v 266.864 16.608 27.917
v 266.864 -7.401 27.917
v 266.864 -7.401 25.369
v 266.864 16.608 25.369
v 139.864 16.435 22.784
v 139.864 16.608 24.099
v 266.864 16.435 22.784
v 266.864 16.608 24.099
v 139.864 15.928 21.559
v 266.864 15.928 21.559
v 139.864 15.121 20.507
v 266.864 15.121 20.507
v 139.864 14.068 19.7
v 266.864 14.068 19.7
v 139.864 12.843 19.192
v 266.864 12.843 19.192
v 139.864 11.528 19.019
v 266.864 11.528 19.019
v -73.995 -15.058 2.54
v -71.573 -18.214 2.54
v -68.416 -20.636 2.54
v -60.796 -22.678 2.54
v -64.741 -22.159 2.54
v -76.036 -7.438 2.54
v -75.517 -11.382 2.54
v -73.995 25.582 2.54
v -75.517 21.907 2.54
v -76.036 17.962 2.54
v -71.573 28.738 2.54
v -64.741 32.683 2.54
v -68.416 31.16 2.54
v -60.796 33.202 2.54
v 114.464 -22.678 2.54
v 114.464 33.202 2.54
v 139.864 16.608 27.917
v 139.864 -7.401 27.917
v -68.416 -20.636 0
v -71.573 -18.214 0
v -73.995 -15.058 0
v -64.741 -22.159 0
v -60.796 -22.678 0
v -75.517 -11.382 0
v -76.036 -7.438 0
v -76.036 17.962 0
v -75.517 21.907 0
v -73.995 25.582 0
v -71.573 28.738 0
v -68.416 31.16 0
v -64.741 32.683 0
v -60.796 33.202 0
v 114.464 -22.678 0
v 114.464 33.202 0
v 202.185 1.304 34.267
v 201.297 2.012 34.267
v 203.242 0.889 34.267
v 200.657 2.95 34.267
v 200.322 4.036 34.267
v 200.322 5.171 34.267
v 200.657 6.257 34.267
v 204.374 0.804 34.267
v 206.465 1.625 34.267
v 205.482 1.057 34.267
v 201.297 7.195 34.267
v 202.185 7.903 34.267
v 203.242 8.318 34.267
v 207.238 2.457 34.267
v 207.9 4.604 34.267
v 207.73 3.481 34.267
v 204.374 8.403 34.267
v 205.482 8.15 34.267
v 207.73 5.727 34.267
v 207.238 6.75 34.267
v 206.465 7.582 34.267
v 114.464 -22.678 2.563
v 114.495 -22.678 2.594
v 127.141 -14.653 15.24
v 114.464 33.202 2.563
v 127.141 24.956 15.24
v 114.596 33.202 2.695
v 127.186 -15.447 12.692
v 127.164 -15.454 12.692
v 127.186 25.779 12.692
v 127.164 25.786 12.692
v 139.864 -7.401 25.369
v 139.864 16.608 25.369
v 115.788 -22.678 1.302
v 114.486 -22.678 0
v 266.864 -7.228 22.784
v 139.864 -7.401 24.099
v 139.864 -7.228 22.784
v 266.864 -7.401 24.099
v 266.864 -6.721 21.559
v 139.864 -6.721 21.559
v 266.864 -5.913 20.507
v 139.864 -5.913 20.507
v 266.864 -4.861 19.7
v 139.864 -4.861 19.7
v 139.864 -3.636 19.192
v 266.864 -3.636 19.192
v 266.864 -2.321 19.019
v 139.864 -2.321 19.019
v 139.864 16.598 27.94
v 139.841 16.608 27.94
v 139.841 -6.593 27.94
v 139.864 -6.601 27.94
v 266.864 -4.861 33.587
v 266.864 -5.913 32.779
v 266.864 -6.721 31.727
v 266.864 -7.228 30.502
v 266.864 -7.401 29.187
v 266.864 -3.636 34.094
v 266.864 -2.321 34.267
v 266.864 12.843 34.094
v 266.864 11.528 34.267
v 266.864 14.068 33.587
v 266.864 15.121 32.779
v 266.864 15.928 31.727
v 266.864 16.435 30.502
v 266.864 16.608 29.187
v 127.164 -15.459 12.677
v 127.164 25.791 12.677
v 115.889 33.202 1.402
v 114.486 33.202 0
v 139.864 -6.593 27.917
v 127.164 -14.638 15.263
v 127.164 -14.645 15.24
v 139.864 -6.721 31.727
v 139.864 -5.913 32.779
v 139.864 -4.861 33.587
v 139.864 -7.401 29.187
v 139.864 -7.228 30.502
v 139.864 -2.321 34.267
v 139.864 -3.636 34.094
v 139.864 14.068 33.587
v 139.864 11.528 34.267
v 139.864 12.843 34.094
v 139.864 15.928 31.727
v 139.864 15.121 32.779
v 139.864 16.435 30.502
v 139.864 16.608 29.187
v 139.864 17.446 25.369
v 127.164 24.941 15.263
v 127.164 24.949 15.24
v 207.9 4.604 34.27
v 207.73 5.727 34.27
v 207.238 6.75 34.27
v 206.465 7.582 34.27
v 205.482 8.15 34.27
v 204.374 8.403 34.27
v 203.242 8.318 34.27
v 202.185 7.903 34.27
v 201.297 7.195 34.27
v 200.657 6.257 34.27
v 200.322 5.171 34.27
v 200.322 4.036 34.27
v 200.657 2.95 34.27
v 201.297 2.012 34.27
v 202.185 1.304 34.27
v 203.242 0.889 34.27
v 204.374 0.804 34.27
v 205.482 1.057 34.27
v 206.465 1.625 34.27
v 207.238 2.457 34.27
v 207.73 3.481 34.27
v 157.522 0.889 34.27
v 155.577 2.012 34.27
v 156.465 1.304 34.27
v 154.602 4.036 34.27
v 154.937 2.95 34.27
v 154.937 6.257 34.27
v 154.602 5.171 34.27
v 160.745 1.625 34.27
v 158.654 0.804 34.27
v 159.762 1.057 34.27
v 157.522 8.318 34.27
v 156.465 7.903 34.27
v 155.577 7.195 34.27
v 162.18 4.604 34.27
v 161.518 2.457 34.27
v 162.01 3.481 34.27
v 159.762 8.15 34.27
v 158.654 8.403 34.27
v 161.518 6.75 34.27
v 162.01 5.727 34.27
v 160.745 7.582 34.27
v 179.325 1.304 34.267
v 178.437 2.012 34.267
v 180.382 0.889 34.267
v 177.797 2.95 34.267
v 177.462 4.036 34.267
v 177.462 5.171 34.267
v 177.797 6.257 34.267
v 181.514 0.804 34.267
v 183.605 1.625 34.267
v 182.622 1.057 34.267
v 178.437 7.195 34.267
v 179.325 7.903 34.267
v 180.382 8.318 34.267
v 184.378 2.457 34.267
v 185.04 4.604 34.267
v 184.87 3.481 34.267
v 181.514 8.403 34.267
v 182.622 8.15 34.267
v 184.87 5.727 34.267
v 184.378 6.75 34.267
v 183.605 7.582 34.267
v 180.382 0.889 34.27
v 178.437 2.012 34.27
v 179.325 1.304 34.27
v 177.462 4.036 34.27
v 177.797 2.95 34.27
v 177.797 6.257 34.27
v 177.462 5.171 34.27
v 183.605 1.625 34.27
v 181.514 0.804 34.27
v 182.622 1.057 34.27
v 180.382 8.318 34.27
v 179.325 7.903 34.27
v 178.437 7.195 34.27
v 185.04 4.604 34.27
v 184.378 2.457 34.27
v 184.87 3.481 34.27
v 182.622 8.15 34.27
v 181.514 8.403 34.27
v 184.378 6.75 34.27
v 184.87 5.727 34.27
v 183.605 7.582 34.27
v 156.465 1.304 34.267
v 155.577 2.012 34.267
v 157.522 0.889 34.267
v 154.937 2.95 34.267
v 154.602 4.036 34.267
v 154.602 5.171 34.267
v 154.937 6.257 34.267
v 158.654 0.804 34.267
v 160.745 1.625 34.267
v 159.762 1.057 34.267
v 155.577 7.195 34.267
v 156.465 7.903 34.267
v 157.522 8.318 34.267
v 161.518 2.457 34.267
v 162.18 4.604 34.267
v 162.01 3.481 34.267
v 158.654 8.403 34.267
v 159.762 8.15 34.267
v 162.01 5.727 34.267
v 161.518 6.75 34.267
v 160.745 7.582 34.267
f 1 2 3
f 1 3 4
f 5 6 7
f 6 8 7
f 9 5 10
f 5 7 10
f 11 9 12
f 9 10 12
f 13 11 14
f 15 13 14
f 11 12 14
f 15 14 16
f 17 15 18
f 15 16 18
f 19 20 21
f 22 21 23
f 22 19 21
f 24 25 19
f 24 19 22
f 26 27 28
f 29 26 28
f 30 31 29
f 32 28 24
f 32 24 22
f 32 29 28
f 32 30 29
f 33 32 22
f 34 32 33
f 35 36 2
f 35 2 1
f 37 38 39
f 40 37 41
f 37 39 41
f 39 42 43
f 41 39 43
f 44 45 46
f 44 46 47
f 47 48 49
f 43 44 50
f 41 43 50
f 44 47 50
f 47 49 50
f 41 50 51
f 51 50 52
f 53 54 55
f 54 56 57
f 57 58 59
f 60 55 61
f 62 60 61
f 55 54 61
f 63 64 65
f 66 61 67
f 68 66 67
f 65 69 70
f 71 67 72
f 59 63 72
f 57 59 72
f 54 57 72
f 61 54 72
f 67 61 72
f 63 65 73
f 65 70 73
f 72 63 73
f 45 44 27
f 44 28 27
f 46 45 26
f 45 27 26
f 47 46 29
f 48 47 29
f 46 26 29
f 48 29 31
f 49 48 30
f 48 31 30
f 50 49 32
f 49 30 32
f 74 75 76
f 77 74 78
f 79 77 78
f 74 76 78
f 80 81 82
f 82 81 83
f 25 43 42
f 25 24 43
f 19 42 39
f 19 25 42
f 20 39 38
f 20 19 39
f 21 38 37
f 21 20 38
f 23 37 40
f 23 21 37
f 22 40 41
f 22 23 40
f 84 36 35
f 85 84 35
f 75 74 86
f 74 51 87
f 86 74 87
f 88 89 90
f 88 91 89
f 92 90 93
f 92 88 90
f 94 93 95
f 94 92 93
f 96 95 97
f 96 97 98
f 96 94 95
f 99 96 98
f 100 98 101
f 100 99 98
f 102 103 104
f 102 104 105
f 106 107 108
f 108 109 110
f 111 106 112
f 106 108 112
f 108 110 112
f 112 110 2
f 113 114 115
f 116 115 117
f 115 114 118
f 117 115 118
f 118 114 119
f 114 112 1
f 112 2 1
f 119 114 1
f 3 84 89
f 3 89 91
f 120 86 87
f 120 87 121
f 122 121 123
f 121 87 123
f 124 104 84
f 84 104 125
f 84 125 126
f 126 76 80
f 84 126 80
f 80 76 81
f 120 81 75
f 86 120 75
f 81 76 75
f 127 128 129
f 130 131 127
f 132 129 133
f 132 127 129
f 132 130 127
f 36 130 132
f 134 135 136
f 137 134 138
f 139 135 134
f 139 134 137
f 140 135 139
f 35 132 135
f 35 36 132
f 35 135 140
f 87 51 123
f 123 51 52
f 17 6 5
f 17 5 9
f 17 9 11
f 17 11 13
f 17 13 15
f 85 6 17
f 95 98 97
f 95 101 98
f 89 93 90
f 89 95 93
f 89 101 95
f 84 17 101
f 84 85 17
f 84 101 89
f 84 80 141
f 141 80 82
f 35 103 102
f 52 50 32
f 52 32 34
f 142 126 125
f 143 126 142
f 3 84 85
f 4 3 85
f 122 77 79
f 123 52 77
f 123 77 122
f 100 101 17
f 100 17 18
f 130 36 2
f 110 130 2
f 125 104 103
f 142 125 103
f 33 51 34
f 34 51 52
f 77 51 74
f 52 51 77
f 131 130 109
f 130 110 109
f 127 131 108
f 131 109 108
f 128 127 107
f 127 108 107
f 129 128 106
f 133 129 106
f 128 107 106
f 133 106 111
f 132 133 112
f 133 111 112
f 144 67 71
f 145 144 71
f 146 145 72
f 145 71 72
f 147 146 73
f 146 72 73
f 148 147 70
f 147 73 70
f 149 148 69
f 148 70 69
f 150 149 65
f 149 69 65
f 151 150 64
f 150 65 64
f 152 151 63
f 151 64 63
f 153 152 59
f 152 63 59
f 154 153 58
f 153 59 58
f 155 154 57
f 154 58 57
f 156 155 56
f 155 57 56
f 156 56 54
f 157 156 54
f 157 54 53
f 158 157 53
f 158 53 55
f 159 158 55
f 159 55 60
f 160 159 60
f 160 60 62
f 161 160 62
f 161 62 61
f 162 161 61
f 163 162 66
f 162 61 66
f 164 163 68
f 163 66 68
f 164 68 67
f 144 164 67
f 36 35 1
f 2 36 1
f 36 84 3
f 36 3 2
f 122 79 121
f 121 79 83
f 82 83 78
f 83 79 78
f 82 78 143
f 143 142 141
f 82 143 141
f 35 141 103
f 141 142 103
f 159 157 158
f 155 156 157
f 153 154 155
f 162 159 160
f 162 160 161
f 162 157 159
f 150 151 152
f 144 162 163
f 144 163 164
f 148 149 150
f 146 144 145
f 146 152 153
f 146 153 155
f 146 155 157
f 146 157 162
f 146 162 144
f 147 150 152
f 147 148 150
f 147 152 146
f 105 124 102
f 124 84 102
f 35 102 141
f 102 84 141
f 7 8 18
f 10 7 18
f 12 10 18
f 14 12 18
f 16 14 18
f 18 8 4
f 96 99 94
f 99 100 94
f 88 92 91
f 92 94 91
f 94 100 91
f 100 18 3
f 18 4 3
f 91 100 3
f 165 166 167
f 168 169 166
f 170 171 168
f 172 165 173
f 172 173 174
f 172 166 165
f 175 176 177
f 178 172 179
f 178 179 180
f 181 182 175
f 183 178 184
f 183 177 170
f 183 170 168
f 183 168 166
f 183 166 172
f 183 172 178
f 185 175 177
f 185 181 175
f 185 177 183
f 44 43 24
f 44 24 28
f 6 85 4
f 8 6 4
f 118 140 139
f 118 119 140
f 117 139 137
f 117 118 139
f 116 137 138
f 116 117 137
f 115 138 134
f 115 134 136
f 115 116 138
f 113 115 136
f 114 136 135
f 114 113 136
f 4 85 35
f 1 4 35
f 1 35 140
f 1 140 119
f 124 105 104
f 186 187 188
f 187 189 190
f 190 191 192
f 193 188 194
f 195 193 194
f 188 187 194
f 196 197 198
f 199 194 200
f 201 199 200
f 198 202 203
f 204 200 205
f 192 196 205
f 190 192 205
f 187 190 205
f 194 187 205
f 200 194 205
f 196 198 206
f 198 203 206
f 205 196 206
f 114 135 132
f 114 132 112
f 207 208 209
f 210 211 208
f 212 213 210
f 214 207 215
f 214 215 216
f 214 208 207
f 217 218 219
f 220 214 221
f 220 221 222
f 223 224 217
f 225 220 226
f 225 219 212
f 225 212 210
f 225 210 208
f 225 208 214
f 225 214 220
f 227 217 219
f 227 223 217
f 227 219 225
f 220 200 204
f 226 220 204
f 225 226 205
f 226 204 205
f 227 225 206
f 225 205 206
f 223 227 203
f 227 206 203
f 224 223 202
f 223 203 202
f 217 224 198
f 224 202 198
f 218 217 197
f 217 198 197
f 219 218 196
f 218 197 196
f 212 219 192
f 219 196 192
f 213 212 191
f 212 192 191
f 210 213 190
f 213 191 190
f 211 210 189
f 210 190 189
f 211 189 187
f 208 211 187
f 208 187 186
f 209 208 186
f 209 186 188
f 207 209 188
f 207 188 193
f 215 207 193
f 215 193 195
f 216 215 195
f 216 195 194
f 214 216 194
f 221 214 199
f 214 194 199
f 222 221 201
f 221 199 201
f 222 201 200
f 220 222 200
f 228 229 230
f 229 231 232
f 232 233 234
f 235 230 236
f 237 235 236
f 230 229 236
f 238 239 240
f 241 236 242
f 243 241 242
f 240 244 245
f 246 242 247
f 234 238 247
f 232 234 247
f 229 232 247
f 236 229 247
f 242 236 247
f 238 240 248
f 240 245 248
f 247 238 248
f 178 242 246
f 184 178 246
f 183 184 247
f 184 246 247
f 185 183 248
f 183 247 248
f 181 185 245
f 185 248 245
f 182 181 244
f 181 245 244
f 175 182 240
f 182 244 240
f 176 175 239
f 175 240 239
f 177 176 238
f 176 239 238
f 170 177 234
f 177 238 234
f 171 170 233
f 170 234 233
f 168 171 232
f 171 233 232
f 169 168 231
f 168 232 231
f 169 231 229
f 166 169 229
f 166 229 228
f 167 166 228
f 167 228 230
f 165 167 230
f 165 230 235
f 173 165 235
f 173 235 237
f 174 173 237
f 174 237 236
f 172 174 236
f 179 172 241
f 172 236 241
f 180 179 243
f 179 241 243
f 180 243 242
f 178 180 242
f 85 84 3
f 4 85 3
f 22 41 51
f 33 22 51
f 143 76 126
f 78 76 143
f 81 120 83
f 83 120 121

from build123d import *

# Parameters (mm, degrees)
F0_W      = 190.5
F0_H      = 55.88
F1_DEPTH  = 2.54
F2_W      = 55.88
F2_H      = 2.54
F3_DEPTH  = 12.7
F4_W      = 12.7
F4_H      = 55.88
F5_DEPTH  = 12.7
F6_W      = 55.88
F6_H      = 2.5481501573
F7_DEPTH  = 12.7
F8_W      = 12.7
F8_H      = 55.88
F9_DEPTH  = 12.7
F10_SIZE  = 12.67714
F12_DEPTH = 25.4
F14_DEPTH = 25.4
F15_W     = 24.0098635365
F15_H     = 2.5481501573
F16_DEPTH = 127
F17_W     = 127
F17_H     = 24.0098635365
F18_DEPTH = 6.35
F19_W     = 127
F19_H     = 24.0098635365
F20_DEPTH = 6.35
F21_R     = 15.24
F22_R     = 5.08
F22_2_R   = 5.08
F23_R     = 3.81
F24_DEPTH = 0.00254


with BuildPart() as f1:
    # F0 (on Top) → F1 (new body)
    with BuildSketch(Plane.XY):
        with Locations((19.2136056721, 5.2621446662)):
            Rectangle(F0_W, F0_H)
    extrude(amount=F1_DEPTH)

    # F21
    f21_edges = [f1.edges().sort_by_distance(p)[0] for p in [
        (-76.036394, 33.202145, 1.27),
        (-76.036394, -22.677855, 1.27),
    ]]
    fillet(f21_edges, radius=F21_R)


with BuildPart() as f3:
    # F2 (on face) → F3 (new body)
    with BuildSketch(Plane.YZ.offset(114.4636056721)):
        with Locations((5.2621446662, 1.27)):
            Rectangle(F2_W, F2_H)
    extrude(amount=F3_DEPTH)

    # F4 (on face) → F5 (join)
    with BuildSketch(Plane.XY.offset(2.54)):
        with Locations((120.8136056721, 5.2621446662)):
            Rectangle(F4_W, F4_H)
    extrude(amount=F5_DEPTH)

    # F6 (on face) → F7 (join)
    with BuildSketch(Plane.YZ.offset(127.1636056721)):
        with Locations((5.2621446662, 13.9659249213)):
            Rectangle(F6_W, F6_H)
    extrude(amount=F7_DEPTH)

    # F8 (on face) → F9 (join)
    with BuildSketch(Plane.XY.offset(15.24)):
        with Locations((133.5136056721, 5.2621446662)):
            Rectangle(F8_W, F8_H)
    extrude(amount=F9_DEPTH)

    # F10
    f10_edges = [f3.edges().sort_by_distance(p)[0] for p in [
        (127.163606, 5.262145, 27.94),
        (114.463606, 5.262145, 15.24),
        (139.863606, 5.262145, 12.69185),
        (127.163606, 5.262145, 0),
    ]]
    chamfer(f10_edges, length=F10_SIZE)

    # F11 (on face) → F12 (cut)
    with BuildSketch(Plane(origin=(55.9503728361, 0, -55.9503728361), x_dir=(0.7071067812, 0, 0.7071067812), z_dir=(-0.7071067812, 0, 0.7071067812))):
        Polygon((118.6389030173, 33.2021446662), (82.9373598099, 33.2021446662), (118.6389030173, 16.6084691882), align=None)
        Polygon((118.6389030173, -6.5928315744), (82.794778049, -22.6778553338), (118.6389030173, -22.6778553338), align=None)
    extrude(amount=-F12_DEPTH, mode=Mode.SUBTRACT)

    # F13 (on face) → F14 (cut)
    with BuildSketch(Plane(origin=(55.9503728361, 0, -55.9503728361), x_dir=(0.7071067812, 0, 0.7071067812), z_dir=(-0.7071067812, 0, 0.7071067812))):
        Polygon((116.1913573742, 21.231610328), (118.6389030173, 16.6084691882), (121.2114244699, 14.9507913738), (122.3802044988, 27.3574646562), (118.6389030173, 36.1816585064), align=None)
        Polygon((120.5083355308, -7.4875173159), (118.6389030173, -6.5928315744), (116.9947695874, -8.2805254063), (116.0452738404, -18.3594822884), (117.9651161949, -25.1031260163), (120.5083355308, -19.7891071439), align=None)
    extrude(amount=-F14_DEPTH, mode=Mode.SUBTRACT)


with BuildPart() as f16:
    # F15 (on face) → F16 (new body)
    with BuildSketch(Plane.YZ.offset(139.8636056721)):
        with Locations((4.60353742, 26.6430649213)):
            Rectangle(F15_W, F15_H)
    extrude(amount=F16_DEPTH)


with BuildPart() as f18:
    # F17 (on face) → F18 (new body)
    with BuildSketch(Plane.XY.offset(27.91714)):
        with Locations((203.3636056721, 4.60353742)):
            Rectangle(F17_W, F17_H)
    extrude(amount=F18_DEPTH)

    # F22
    f22_edges = [f18.edges().sort_by_distance(p)[0] for p in [
        (203.363606, -7.401394, 34.26714),
        (203.363606, 16.608469, 34.26714),
    ]]
    fillet(f22_edges, radius=F22_R)


with BuildPart() as f20:
    # F19 (on face) → F20 (new body)
    with BuildSketch(Plane(origin=(0, 0, 25.3689898427), x_dir=(1, 0, 0), z_dir=(0, 0, -1))):
        with Locations((203.3636056721, -4.60353742)):
            Rectangle(F19_W, F19_H)
    extrude(amount=F20_DEPTH)

    # F22#2
    f22_2_edges = [f20.edges().sort_by_distance(p)[0] for p in [
        (203.363606, -7.401394, 19.01899),
        (203.363606, 16.608469, 19.01899),
    ]]
    fillet(f22_2_edges, radius=F22_2_R)


with BuildPart() as f24:
    # F23 (on face) → F24 (new body)
    with BuildSketch(Plane.XY.offset(34.26714)):
        with Locations((158.3697497845, 4.60353742)):
            Circle(F23_R)
    extrude(amount=F24_DEPTH)


with BuildPart() as f24b:
    # F23 (on face) → F24, piece 2 (new body)
    with BuildSketch(Plane.XY.offset(34.26714)):
        with Locations((181.2297497845, 4.60353742)):
            Circle(F23_R)
    extrude(amount=F24_DEPTH)


with BuildPart() as f24c:
    # F23 (on face) → F24, piece 3 (new body)
    with BuildSketch(Plane.XY.offset(34.26714)):
        with Locations((204.0897497845, 4.60353742)):
            Circle(F23_R)
    extrude(amount=F24_DEPTH)


solid = Compound([f1.part, f3.part, f16.part, f18.part, f20.part, f24.part, f24b.part, f24c.part])
